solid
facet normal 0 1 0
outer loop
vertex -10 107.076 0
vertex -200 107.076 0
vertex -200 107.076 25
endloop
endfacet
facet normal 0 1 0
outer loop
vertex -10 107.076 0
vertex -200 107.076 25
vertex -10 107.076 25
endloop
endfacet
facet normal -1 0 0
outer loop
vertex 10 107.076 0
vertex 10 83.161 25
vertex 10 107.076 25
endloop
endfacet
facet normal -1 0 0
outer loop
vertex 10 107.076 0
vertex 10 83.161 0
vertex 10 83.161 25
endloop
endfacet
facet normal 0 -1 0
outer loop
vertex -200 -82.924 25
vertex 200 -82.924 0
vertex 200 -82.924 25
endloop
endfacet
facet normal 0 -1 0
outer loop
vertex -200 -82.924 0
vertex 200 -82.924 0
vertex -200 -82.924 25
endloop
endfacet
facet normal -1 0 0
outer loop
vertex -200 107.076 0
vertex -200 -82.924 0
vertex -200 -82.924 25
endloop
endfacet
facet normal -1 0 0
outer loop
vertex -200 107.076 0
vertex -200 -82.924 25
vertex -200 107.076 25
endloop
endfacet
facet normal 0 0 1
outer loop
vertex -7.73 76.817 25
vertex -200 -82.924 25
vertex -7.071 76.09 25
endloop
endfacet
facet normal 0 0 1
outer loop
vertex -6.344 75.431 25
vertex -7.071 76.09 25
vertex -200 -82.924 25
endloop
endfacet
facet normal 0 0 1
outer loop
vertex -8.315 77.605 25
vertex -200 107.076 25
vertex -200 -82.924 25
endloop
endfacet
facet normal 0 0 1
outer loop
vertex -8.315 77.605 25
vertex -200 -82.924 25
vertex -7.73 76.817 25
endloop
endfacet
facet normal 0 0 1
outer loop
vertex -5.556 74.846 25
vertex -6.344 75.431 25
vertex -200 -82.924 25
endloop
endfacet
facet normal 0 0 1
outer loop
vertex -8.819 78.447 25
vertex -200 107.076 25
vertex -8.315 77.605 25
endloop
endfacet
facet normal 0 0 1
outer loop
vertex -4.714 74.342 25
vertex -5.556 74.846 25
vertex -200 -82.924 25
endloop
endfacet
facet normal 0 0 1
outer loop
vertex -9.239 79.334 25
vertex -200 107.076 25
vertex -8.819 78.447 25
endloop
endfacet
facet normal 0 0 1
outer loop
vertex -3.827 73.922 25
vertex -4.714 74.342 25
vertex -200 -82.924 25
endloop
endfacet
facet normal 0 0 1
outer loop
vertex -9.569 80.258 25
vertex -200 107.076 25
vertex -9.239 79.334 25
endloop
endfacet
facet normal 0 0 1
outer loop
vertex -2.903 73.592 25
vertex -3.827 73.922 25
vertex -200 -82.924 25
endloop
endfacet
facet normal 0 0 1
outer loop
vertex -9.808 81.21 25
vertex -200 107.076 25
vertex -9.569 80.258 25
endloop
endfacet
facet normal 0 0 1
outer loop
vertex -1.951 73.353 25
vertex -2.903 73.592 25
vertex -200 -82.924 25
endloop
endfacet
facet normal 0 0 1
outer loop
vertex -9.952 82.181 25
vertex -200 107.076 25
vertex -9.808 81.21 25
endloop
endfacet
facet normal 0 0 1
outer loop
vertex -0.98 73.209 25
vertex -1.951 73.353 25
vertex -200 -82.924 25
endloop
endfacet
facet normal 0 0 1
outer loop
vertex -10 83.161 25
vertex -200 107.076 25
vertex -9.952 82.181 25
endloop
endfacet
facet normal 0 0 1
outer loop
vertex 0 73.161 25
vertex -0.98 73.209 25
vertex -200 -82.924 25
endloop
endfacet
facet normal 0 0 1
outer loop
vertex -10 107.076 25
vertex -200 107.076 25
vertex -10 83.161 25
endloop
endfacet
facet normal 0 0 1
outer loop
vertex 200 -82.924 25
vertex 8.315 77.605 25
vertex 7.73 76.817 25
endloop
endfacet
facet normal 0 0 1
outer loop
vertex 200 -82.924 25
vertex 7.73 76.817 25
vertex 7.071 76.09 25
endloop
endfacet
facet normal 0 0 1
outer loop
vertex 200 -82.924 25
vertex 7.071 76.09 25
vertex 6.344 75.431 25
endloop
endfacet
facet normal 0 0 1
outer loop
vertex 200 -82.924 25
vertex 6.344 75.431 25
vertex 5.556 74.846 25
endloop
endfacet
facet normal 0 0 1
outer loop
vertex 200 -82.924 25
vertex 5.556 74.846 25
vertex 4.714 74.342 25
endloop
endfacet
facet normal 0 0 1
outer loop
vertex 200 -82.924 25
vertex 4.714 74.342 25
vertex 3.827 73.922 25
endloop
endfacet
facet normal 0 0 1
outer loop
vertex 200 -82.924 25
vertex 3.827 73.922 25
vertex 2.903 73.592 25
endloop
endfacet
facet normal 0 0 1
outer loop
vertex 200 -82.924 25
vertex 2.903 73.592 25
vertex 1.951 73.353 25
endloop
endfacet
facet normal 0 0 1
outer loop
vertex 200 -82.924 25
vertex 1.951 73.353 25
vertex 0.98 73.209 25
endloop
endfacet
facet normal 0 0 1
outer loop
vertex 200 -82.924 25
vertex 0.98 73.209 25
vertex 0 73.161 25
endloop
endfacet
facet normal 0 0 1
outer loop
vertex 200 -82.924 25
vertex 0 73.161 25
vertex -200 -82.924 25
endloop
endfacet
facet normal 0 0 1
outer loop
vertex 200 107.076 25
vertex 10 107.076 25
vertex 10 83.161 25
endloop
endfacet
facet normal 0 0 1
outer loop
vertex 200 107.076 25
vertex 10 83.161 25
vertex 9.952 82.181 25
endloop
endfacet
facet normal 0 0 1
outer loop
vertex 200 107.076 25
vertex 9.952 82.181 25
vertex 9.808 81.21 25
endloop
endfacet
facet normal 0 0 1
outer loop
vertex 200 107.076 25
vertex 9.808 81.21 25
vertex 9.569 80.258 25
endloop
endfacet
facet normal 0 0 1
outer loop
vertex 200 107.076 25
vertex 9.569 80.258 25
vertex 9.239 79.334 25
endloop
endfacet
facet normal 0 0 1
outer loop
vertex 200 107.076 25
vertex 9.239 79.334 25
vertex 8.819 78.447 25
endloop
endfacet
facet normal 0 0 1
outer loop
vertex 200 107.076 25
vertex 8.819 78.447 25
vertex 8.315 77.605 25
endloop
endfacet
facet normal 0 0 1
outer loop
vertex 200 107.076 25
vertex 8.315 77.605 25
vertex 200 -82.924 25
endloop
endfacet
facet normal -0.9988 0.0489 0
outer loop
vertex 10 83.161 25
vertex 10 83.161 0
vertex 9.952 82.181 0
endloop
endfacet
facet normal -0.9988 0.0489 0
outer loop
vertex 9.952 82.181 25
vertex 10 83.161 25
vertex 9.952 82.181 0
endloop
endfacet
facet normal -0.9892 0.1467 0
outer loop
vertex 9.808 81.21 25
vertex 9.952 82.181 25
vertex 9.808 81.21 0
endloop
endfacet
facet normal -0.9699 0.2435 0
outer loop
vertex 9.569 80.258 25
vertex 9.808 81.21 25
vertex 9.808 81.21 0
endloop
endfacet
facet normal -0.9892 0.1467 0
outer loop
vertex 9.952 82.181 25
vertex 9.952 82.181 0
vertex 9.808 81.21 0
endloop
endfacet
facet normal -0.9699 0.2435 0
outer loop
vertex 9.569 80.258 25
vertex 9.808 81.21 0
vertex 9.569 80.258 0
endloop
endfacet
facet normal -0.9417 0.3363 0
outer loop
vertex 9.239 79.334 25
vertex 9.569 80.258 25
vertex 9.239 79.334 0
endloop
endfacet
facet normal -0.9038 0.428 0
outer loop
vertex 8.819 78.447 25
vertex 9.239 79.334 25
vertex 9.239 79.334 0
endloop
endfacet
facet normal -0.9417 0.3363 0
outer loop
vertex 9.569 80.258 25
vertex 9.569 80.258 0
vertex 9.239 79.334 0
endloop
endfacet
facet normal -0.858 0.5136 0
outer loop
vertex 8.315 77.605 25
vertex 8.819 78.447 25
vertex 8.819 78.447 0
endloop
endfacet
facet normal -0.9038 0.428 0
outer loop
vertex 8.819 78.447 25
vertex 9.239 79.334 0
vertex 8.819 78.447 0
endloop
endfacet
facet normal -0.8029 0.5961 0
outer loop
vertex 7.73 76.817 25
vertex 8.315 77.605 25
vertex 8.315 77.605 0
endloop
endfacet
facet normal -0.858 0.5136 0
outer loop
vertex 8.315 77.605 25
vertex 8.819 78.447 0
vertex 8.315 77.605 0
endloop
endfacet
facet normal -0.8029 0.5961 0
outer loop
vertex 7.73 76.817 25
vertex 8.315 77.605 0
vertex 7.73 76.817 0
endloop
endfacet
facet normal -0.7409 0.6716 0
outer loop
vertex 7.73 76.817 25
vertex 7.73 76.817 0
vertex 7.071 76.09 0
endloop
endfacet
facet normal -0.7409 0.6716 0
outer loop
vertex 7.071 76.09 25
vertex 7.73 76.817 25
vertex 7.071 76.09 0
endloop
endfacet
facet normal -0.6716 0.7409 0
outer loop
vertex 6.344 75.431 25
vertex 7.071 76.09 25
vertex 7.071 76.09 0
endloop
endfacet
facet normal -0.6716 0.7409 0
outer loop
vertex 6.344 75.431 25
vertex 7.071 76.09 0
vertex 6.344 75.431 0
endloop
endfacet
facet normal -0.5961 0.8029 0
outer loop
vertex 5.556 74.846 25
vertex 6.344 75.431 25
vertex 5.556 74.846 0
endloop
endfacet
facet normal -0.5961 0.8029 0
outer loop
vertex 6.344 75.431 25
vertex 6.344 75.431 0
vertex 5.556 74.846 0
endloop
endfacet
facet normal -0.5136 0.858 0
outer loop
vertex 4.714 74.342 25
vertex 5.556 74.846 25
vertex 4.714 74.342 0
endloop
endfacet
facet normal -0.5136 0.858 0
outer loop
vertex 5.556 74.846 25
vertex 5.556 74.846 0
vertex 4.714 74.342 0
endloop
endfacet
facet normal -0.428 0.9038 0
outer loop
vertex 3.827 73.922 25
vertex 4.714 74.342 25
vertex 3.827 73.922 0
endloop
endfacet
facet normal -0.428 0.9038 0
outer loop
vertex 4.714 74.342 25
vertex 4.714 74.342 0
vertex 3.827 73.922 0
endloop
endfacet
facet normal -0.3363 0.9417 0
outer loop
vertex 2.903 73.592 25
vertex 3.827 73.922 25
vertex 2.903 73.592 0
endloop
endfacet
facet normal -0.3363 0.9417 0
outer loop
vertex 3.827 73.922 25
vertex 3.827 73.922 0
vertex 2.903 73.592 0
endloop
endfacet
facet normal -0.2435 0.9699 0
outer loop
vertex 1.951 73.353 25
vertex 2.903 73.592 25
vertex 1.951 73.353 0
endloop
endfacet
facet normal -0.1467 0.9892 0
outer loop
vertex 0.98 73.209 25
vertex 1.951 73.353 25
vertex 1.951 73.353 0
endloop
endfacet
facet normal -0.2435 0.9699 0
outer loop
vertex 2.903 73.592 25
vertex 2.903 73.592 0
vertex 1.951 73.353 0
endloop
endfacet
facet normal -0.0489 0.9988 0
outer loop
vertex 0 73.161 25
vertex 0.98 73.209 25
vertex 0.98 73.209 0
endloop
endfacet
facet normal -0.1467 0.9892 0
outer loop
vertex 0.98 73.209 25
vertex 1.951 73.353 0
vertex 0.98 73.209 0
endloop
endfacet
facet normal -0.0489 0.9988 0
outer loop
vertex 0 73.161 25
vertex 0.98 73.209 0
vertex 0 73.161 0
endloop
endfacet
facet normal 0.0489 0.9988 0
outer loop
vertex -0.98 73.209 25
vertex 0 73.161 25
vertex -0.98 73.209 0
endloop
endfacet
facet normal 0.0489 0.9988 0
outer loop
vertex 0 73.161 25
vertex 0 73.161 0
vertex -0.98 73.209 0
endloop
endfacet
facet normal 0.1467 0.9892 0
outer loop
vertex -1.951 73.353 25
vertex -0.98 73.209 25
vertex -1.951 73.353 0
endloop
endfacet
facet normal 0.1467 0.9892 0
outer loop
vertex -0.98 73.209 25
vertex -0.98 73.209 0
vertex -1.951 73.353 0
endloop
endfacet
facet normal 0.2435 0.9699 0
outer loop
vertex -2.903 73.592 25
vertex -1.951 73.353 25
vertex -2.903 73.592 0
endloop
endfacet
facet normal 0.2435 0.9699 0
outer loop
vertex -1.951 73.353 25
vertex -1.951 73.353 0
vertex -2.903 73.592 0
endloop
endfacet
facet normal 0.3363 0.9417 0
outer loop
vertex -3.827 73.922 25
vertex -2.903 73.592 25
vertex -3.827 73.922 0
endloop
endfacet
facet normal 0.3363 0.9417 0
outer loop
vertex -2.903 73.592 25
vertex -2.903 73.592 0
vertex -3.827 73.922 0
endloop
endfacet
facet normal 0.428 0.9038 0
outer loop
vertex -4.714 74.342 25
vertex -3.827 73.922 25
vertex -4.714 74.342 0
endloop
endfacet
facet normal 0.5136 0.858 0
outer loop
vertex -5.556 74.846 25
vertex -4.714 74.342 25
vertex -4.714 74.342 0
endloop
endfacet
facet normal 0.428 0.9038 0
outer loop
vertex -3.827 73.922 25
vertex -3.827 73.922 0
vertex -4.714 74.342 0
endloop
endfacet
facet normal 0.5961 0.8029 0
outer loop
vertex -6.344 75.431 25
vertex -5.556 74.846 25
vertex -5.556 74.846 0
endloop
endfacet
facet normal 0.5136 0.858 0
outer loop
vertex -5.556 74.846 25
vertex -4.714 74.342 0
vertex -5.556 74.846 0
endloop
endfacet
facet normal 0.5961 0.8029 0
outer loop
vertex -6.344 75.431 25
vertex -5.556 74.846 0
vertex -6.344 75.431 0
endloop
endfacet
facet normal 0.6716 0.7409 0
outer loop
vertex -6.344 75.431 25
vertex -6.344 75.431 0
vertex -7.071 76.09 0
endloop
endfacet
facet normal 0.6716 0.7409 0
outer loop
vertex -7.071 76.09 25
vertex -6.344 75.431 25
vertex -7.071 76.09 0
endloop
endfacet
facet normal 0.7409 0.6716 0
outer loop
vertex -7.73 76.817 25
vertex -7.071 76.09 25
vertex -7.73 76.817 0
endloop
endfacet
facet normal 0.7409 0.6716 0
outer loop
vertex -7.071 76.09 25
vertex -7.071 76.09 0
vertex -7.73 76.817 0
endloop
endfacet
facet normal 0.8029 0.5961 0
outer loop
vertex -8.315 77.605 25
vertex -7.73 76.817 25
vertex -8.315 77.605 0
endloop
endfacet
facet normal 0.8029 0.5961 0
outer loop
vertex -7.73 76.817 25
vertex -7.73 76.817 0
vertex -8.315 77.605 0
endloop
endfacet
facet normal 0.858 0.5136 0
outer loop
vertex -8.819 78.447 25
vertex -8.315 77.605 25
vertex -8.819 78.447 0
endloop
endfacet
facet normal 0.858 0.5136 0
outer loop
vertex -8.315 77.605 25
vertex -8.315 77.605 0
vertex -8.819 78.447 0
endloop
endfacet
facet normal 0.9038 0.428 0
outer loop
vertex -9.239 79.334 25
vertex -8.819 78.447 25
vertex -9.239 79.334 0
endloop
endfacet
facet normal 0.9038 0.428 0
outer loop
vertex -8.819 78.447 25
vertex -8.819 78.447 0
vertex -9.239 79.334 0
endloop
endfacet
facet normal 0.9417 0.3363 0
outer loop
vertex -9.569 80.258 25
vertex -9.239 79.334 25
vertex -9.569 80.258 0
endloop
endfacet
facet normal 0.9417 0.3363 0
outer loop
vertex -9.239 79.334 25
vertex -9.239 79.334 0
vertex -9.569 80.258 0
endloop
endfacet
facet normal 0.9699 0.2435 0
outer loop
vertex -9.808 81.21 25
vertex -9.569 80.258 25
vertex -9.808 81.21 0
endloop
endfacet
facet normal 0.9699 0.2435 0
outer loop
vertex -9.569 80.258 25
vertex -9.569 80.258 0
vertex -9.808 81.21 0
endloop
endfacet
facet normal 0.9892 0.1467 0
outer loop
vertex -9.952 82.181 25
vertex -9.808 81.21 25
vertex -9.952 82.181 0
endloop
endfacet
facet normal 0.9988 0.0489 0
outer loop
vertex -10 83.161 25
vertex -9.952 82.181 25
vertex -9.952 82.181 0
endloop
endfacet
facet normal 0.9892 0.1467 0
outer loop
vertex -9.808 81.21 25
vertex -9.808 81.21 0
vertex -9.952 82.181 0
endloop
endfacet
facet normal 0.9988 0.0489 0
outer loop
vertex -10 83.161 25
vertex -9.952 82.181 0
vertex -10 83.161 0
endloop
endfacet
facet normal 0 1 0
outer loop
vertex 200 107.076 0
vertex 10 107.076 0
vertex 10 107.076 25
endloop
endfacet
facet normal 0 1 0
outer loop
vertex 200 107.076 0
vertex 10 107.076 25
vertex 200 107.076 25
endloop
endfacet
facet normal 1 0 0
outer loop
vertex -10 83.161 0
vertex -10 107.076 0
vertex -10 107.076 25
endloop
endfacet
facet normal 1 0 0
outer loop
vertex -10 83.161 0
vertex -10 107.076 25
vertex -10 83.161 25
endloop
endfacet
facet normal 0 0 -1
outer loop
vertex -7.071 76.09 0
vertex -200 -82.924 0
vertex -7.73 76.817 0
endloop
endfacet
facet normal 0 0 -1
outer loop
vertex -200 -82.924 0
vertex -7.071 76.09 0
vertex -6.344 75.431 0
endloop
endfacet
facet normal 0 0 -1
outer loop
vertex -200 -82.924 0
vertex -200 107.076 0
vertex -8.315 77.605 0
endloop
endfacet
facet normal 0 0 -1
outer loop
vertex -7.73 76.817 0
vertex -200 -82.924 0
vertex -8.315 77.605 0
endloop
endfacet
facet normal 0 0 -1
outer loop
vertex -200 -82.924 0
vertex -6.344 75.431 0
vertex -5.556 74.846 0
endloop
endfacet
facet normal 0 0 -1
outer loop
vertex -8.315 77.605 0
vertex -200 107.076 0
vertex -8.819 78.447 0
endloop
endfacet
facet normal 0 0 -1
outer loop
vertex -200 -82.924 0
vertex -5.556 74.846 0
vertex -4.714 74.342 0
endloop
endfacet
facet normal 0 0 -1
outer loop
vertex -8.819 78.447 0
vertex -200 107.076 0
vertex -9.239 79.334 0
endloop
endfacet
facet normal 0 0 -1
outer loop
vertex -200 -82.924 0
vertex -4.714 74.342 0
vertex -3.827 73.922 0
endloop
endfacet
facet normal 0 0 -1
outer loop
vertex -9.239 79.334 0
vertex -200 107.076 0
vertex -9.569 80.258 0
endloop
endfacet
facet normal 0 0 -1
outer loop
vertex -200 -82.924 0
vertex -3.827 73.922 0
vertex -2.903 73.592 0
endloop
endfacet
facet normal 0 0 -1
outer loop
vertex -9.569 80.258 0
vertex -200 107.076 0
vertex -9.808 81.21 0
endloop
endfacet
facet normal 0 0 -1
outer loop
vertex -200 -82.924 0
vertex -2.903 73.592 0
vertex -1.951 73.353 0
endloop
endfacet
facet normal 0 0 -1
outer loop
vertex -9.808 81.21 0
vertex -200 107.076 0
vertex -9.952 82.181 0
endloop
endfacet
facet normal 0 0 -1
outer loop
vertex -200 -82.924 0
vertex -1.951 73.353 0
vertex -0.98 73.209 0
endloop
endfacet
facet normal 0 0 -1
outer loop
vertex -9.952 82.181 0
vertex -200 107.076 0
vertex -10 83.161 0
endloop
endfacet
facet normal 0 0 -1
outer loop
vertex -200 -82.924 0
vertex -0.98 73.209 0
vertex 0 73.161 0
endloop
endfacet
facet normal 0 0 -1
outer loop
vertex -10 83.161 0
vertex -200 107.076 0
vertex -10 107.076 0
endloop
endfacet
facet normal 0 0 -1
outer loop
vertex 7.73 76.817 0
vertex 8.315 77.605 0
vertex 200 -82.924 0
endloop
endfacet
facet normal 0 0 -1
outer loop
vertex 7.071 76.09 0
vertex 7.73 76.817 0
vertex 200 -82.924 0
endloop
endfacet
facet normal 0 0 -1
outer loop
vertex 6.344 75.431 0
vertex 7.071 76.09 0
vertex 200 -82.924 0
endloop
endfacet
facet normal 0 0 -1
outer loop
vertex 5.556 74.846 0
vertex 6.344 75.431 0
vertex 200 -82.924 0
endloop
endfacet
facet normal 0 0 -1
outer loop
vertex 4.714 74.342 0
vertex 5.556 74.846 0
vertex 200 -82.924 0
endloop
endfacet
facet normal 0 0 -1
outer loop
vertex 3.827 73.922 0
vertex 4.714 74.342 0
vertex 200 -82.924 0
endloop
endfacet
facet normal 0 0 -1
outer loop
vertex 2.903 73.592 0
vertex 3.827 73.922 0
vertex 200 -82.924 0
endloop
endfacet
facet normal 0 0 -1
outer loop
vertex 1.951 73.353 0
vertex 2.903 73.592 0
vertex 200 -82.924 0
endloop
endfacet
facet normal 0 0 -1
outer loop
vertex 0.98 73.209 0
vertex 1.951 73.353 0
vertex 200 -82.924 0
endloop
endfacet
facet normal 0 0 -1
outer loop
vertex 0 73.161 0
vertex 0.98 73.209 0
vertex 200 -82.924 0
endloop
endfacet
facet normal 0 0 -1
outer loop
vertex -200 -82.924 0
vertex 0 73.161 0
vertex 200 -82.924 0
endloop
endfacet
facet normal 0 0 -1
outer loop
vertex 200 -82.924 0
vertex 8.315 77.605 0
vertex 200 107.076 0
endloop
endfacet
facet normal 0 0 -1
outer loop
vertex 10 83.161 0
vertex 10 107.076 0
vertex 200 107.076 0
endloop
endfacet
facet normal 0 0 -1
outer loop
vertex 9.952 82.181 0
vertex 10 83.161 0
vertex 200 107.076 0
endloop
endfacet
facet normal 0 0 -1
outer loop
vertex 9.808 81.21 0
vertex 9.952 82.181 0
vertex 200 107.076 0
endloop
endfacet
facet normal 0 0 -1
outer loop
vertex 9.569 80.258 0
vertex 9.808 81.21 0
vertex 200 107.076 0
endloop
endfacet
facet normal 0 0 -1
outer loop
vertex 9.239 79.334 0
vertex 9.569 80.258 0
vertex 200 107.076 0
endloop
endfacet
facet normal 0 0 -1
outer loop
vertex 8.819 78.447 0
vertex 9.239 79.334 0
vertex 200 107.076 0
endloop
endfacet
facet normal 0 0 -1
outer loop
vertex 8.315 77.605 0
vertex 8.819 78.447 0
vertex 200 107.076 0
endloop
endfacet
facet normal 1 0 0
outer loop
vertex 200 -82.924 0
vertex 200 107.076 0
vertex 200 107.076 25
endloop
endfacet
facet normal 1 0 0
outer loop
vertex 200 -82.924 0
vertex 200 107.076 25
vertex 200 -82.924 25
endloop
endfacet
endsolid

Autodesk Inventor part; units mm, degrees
ref_plane "YZ Plane" through (0, 0, 0) normal (1, 0, 0) x (0, 1, 0)
ref_plane "XZ Plane" through (0, 0, 0) normal (0, 1, 0) x (-1, 0, 0)
ref_plane "XY Plane" through (0, 0, 0) normal (0, 0, 1) x (1, 0, 0)
sketch "Skizze1" plane through (0, 0, 0) normal (0, 0, 1) x (1, 0, 0)
  line L0 (-280, 0) -> (280, 0) projected
  line L1 (0, -126.7237) -> (0, 179.8763) projected
  line L2 (-200, 107.0763) -> (200, 107.0763)
  line L3 (200, 107.0763) -> (200, -82.9237)
  line L4 (200, -82.9237) -> (-200, -82.9237)
  line L5 (-200, -82.9237) -> (-200, 107.0763)
  point P0 (0, 0)
  dimension "d0" = 190
  dimension "d1" = 400
extrude "Extrusion1" add sketch "Skizze1" along normal blind 25
sketch "Skizze2" plane through (-200, 107.0763, 0) normal (0, 1, 0) x (1, 0, 0)
  line L0 (0, -25) -> (400, -25) projected
  point P0 (200, 0)
sketch "Skizze4" plane through (0, 0, 0) normal (0, 0, -1) x (-1, 0, 0)
  line L0 (-200, 107.0763) -> (200, 107.0763) projected
  line L1 (-10, 107.0763) -> (10, 107.0763)
  line L2 (10, 107.0763) -> (10, 83.161)
  line L3 (10, 83.161) -> (-10, 83.161)
  line L4 (-10, 83.161) -> (-10, 107.0763)
  circle A0 centre (0, 83.161) radius 10
  point P0 (0, 0)
  dimension "d12" = 20
  dimension "d13" = 10
extrude "Extrusion3" cut sketch "Skizze4" against normal blind 25
properties part number "Verkleidungsdeckel"
